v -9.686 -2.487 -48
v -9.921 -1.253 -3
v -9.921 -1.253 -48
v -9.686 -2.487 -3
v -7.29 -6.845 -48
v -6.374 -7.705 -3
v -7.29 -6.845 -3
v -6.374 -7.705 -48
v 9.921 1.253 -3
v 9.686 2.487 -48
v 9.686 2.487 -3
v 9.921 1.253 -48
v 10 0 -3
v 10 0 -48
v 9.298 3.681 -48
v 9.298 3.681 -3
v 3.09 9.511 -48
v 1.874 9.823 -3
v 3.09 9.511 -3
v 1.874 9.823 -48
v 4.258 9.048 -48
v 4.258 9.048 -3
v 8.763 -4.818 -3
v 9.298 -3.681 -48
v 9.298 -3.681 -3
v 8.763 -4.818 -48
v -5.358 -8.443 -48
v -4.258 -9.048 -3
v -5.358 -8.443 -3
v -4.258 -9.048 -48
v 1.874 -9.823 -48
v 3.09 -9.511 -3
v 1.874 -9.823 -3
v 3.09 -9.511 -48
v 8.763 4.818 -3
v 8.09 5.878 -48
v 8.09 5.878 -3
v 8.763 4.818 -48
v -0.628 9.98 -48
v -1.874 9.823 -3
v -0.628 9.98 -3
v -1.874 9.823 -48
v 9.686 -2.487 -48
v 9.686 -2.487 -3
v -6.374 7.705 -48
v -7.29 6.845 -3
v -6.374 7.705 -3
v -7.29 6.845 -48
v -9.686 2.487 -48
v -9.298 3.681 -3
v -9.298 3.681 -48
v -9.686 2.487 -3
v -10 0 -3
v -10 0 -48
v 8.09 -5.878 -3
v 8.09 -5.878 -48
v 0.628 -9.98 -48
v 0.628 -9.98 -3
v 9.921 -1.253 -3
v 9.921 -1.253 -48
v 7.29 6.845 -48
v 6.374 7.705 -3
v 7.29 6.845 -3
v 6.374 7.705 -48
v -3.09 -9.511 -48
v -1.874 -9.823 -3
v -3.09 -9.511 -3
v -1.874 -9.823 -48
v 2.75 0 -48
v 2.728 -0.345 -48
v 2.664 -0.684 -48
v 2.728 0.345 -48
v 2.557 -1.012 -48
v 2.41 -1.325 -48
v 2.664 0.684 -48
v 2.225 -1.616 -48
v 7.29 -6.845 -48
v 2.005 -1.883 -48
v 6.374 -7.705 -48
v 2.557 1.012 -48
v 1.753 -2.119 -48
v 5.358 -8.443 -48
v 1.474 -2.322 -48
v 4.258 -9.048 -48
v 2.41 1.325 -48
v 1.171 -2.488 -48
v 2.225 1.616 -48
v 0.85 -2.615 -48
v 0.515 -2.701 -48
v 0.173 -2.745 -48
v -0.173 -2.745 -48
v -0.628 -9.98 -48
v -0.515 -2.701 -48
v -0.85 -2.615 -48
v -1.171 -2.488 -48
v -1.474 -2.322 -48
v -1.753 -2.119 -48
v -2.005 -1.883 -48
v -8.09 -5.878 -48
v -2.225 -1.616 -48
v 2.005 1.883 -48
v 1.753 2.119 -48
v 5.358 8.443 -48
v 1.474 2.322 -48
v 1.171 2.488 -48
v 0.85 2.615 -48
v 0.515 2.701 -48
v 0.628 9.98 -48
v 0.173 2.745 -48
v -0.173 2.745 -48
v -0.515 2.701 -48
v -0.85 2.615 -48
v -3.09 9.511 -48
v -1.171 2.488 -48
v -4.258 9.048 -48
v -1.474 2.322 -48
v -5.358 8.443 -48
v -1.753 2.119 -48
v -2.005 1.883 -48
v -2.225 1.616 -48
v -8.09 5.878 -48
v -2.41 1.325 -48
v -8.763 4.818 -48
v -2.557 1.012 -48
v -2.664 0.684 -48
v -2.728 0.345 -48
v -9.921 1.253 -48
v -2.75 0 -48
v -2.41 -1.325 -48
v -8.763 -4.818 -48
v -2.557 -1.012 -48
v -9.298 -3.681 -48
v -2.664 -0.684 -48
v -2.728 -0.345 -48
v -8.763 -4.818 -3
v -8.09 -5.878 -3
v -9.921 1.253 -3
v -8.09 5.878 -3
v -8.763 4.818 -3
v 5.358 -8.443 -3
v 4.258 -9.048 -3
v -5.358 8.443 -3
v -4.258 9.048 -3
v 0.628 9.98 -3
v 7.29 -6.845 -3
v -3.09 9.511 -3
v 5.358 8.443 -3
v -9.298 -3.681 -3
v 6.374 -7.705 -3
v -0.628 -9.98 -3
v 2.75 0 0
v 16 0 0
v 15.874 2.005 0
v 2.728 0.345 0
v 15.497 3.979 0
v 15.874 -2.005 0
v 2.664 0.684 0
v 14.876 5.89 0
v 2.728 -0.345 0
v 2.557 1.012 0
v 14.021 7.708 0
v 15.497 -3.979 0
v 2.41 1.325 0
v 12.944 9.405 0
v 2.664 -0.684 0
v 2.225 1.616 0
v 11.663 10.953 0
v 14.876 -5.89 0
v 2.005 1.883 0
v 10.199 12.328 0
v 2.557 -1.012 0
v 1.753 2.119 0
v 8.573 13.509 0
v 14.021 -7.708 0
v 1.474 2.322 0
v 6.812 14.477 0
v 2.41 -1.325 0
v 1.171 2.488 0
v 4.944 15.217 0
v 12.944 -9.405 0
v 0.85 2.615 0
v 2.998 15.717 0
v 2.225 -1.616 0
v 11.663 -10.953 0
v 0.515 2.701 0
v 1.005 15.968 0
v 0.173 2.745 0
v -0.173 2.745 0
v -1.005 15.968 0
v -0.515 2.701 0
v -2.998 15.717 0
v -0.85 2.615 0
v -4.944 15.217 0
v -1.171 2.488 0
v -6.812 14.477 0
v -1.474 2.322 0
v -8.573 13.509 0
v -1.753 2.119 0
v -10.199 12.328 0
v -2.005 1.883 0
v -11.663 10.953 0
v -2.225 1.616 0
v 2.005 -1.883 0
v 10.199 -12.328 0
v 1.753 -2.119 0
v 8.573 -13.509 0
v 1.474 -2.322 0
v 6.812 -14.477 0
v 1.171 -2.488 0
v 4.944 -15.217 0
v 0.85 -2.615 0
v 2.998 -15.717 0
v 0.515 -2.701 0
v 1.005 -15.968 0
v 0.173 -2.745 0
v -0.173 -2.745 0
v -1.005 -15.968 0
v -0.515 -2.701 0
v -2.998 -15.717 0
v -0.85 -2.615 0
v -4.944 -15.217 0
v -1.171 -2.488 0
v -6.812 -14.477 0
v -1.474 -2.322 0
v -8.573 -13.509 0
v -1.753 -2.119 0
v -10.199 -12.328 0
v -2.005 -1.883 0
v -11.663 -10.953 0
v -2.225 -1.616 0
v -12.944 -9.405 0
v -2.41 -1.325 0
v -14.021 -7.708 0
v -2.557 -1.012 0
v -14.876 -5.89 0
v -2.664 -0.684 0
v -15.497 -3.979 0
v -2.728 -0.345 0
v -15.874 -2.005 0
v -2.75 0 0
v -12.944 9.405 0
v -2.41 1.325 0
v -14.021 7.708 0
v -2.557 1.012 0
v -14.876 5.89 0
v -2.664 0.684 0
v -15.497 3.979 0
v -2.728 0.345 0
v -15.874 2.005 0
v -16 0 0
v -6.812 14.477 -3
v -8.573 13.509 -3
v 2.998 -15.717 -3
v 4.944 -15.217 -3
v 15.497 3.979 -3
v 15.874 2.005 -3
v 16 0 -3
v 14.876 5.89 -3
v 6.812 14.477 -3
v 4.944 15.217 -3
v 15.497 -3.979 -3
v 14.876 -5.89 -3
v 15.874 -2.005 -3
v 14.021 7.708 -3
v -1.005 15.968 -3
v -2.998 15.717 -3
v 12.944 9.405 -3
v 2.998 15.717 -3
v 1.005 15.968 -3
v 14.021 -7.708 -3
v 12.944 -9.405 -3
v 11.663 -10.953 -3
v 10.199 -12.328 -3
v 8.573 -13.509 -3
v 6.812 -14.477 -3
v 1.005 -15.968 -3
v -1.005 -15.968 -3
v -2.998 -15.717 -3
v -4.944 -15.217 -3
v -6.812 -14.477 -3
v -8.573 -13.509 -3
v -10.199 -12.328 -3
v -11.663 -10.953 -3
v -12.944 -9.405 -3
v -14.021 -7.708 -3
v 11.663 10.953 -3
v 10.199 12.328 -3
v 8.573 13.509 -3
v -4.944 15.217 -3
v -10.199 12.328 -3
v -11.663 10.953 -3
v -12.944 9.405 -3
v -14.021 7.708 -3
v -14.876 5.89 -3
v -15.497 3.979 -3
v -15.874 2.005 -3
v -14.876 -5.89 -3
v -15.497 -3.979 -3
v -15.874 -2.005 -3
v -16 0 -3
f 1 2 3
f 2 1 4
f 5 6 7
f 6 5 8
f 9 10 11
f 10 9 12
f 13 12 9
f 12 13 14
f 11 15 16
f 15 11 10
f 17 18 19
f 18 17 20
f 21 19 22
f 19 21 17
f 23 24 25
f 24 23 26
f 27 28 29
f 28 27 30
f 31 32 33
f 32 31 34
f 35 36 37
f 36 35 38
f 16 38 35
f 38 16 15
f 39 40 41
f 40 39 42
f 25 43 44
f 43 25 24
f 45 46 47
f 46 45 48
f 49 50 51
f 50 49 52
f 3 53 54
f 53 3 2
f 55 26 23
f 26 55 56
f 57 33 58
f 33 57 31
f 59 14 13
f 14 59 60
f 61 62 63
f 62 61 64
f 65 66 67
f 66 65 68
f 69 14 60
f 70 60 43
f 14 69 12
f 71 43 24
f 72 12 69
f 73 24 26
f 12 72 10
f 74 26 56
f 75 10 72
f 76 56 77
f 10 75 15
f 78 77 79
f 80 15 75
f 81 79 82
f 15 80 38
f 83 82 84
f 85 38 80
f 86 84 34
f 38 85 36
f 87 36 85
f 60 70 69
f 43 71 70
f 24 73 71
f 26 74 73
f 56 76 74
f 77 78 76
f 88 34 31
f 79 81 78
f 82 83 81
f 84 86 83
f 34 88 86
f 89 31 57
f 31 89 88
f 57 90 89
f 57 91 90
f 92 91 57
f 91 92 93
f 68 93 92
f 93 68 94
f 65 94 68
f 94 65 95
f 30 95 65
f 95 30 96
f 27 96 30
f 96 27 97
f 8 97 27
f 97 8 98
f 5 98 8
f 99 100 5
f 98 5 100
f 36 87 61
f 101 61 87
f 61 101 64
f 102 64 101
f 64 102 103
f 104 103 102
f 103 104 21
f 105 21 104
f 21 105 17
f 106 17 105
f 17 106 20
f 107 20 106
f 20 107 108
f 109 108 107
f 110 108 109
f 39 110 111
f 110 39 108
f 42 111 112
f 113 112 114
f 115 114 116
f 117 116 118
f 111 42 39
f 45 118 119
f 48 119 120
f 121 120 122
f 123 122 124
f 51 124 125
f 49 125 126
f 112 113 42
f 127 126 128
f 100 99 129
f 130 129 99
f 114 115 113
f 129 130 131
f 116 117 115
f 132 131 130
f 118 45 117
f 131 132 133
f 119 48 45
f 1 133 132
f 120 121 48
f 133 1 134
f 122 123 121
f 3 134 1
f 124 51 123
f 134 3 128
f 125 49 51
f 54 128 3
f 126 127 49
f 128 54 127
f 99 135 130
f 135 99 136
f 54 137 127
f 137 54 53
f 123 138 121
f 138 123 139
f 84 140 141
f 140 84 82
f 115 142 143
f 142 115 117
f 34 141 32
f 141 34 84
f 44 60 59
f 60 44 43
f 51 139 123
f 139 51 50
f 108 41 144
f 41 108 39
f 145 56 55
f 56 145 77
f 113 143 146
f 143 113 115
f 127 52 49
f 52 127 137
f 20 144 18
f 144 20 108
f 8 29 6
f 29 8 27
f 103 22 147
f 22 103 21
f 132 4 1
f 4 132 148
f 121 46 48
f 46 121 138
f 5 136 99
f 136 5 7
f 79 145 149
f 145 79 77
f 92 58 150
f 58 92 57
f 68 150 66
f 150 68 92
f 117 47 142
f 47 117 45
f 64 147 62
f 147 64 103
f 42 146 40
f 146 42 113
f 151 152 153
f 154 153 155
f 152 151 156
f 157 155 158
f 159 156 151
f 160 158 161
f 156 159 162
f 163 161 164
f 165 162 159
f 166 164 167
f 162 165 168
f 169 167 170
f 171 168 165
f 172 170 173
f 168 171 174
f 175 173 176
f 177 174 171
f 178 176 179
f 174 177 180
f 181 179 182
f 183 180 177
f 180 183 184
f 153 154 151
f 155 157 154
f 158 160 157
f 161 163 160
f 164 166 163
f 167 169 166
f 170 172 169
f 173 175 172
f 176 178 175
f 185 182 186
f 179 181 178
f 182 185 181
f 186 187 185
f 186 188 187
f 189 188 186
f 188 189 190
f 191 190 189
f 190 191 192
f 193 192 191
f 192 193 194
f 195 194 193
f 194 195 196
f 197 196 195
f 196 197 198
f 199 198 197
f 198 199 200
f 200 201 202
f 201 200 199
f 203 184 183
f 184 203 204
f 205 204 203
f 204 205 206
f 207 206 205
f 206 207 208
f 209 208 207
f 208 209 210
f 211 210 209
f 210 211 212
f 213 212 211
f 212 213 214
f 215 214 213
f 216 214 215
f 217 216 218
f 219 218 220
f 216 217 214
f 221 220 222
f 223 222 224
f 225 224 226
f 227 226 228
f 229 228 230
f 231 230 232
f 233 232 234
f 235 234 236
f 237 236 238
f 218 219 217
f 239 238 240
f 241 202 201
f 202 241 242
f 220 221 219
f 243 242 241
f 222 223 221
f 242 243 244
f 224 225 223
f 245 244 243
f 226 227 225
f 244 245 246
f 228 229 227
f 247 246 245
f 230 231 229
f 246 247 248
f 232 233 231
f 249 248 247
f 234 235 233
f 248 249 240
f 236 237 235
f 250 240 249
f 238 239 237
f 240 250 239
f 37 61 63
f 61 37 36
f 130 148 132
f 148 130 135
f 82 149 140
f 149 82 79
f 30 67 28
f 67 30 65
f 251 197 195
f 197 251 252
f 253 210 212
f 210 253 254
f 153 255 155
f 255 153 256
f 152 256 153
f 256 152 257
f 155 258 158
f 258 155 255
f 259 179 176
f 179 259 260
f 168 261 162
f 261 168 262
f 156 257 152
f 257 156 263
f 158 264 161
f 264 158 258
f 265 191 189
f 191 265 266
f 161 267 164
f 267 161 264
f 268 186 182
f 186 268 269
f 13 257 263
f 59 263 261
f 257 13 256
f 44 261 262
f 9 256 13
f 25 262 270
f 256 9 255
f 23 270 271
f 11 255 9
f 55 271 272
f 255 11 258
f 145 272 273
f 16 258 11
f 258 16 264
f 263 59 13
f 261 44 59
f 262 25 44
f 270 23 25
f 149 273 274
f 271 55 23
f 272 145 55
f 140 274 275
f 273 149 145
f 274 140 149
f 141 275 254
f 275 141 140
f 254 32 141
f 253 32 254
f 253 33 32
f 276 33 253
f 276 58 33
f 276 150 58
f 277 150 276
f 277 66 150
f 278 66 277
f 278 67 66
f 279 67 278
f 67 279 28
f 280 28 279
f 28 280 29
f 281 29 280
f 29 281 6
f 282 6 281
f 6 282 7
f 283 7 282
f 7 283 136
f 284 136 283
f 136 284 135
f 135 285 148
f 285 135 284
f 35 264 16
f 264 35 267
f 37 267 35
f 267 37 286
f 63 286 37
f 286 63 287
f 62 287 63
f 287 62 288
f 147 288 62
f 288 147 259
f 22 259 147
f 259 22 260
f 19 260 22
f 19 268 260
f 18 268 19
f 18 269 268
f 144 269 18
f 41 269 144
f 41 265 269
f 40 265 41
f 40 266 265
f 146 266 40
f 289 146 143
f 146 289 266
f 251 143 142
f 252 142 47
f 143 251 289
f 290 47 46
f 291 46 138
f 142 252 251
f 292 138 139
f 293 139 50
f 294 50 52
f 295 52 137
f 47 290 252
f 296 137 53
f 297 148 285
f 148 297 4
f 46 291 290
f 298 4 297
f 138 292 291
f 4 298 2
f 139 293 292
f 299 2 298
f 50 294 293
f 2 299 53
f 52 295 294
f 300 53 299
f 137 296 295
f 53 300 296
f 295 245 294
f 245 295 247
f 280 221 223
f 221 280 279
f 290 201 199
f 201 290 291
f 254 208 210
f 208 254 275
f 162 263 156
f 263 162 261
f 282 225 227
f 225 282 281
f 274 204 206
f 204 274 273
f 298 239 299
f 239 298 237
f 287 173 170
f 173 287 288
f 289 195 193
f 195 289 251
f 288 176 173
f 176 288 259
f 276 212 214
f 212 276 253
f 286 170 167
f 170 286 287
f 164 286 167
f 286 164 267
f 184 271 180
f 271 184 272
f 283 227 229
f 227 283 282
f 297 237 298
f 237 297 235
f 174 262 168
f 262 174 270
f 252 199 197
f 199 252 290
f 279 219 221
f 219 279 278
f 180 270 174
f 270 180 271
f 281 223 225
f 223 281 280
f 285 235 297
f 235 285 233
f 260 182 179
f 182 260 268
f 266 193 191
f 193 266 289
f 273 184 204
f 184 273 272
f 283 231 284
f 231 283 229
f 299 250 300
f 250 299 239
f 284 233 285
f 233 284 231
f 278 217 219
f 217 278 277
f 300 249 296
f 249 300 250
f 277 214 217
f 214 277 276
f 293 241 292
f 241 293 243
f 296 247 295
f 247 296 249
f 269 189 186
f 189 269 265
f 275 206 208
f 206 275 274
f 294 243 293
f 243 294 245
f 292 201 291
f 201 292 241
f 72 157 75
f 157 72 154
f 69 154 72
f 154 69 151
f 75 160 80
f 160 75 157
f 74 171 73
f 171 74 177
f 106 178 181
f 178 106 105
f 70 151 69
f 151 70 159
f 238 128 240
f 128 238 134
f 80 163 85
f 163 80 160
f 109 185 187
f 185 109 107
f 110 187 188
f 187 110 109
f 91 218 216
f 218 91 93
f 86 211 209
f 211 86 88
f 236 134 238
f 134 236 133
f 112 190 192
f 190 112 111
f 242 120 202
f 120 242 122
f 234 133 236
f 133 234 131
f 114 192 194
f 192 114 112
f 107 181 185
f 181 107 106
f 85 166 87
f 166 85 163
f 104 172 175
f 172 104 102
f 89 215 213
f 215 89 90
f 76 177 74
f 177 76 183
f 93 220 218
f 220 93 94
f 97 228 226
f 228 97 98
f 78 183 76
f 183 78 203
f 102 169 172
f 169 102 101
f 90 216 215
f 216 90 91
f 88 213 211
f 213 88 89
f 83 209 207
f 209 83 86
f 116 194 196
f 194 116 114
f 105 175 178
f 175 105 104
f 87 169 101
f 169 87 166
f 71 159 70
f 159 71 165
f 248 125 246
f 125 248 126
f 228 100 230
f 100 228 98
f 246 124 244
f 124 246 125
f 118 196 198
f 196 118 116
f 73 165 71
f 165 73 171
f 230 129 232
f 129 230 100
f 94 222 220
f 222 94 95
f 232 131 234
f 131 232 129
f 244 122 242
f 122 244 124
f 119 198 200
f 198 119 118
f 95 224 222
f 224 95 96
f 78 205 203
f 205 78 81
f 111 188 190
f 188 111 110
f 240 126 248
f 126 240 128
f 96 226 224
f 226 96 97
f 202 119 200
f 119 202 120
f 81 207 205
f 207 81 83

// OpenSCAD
$fn = 50;


difference() {
	union() {
		translate(v = [0, 0, -48.0000000000]) {
			cylinder(h = 48, r = 10.0000000000);
		}
		translate(v = [0, 0, -3.0000000000]) {
			cylinder(h = 3, r = 16.0000000000);
		}
	}
	union() {
		#translate(v = [0, 0, -48]) {
			cylinder(h = 48, r = 2.7500000000);
		}
	}
}
